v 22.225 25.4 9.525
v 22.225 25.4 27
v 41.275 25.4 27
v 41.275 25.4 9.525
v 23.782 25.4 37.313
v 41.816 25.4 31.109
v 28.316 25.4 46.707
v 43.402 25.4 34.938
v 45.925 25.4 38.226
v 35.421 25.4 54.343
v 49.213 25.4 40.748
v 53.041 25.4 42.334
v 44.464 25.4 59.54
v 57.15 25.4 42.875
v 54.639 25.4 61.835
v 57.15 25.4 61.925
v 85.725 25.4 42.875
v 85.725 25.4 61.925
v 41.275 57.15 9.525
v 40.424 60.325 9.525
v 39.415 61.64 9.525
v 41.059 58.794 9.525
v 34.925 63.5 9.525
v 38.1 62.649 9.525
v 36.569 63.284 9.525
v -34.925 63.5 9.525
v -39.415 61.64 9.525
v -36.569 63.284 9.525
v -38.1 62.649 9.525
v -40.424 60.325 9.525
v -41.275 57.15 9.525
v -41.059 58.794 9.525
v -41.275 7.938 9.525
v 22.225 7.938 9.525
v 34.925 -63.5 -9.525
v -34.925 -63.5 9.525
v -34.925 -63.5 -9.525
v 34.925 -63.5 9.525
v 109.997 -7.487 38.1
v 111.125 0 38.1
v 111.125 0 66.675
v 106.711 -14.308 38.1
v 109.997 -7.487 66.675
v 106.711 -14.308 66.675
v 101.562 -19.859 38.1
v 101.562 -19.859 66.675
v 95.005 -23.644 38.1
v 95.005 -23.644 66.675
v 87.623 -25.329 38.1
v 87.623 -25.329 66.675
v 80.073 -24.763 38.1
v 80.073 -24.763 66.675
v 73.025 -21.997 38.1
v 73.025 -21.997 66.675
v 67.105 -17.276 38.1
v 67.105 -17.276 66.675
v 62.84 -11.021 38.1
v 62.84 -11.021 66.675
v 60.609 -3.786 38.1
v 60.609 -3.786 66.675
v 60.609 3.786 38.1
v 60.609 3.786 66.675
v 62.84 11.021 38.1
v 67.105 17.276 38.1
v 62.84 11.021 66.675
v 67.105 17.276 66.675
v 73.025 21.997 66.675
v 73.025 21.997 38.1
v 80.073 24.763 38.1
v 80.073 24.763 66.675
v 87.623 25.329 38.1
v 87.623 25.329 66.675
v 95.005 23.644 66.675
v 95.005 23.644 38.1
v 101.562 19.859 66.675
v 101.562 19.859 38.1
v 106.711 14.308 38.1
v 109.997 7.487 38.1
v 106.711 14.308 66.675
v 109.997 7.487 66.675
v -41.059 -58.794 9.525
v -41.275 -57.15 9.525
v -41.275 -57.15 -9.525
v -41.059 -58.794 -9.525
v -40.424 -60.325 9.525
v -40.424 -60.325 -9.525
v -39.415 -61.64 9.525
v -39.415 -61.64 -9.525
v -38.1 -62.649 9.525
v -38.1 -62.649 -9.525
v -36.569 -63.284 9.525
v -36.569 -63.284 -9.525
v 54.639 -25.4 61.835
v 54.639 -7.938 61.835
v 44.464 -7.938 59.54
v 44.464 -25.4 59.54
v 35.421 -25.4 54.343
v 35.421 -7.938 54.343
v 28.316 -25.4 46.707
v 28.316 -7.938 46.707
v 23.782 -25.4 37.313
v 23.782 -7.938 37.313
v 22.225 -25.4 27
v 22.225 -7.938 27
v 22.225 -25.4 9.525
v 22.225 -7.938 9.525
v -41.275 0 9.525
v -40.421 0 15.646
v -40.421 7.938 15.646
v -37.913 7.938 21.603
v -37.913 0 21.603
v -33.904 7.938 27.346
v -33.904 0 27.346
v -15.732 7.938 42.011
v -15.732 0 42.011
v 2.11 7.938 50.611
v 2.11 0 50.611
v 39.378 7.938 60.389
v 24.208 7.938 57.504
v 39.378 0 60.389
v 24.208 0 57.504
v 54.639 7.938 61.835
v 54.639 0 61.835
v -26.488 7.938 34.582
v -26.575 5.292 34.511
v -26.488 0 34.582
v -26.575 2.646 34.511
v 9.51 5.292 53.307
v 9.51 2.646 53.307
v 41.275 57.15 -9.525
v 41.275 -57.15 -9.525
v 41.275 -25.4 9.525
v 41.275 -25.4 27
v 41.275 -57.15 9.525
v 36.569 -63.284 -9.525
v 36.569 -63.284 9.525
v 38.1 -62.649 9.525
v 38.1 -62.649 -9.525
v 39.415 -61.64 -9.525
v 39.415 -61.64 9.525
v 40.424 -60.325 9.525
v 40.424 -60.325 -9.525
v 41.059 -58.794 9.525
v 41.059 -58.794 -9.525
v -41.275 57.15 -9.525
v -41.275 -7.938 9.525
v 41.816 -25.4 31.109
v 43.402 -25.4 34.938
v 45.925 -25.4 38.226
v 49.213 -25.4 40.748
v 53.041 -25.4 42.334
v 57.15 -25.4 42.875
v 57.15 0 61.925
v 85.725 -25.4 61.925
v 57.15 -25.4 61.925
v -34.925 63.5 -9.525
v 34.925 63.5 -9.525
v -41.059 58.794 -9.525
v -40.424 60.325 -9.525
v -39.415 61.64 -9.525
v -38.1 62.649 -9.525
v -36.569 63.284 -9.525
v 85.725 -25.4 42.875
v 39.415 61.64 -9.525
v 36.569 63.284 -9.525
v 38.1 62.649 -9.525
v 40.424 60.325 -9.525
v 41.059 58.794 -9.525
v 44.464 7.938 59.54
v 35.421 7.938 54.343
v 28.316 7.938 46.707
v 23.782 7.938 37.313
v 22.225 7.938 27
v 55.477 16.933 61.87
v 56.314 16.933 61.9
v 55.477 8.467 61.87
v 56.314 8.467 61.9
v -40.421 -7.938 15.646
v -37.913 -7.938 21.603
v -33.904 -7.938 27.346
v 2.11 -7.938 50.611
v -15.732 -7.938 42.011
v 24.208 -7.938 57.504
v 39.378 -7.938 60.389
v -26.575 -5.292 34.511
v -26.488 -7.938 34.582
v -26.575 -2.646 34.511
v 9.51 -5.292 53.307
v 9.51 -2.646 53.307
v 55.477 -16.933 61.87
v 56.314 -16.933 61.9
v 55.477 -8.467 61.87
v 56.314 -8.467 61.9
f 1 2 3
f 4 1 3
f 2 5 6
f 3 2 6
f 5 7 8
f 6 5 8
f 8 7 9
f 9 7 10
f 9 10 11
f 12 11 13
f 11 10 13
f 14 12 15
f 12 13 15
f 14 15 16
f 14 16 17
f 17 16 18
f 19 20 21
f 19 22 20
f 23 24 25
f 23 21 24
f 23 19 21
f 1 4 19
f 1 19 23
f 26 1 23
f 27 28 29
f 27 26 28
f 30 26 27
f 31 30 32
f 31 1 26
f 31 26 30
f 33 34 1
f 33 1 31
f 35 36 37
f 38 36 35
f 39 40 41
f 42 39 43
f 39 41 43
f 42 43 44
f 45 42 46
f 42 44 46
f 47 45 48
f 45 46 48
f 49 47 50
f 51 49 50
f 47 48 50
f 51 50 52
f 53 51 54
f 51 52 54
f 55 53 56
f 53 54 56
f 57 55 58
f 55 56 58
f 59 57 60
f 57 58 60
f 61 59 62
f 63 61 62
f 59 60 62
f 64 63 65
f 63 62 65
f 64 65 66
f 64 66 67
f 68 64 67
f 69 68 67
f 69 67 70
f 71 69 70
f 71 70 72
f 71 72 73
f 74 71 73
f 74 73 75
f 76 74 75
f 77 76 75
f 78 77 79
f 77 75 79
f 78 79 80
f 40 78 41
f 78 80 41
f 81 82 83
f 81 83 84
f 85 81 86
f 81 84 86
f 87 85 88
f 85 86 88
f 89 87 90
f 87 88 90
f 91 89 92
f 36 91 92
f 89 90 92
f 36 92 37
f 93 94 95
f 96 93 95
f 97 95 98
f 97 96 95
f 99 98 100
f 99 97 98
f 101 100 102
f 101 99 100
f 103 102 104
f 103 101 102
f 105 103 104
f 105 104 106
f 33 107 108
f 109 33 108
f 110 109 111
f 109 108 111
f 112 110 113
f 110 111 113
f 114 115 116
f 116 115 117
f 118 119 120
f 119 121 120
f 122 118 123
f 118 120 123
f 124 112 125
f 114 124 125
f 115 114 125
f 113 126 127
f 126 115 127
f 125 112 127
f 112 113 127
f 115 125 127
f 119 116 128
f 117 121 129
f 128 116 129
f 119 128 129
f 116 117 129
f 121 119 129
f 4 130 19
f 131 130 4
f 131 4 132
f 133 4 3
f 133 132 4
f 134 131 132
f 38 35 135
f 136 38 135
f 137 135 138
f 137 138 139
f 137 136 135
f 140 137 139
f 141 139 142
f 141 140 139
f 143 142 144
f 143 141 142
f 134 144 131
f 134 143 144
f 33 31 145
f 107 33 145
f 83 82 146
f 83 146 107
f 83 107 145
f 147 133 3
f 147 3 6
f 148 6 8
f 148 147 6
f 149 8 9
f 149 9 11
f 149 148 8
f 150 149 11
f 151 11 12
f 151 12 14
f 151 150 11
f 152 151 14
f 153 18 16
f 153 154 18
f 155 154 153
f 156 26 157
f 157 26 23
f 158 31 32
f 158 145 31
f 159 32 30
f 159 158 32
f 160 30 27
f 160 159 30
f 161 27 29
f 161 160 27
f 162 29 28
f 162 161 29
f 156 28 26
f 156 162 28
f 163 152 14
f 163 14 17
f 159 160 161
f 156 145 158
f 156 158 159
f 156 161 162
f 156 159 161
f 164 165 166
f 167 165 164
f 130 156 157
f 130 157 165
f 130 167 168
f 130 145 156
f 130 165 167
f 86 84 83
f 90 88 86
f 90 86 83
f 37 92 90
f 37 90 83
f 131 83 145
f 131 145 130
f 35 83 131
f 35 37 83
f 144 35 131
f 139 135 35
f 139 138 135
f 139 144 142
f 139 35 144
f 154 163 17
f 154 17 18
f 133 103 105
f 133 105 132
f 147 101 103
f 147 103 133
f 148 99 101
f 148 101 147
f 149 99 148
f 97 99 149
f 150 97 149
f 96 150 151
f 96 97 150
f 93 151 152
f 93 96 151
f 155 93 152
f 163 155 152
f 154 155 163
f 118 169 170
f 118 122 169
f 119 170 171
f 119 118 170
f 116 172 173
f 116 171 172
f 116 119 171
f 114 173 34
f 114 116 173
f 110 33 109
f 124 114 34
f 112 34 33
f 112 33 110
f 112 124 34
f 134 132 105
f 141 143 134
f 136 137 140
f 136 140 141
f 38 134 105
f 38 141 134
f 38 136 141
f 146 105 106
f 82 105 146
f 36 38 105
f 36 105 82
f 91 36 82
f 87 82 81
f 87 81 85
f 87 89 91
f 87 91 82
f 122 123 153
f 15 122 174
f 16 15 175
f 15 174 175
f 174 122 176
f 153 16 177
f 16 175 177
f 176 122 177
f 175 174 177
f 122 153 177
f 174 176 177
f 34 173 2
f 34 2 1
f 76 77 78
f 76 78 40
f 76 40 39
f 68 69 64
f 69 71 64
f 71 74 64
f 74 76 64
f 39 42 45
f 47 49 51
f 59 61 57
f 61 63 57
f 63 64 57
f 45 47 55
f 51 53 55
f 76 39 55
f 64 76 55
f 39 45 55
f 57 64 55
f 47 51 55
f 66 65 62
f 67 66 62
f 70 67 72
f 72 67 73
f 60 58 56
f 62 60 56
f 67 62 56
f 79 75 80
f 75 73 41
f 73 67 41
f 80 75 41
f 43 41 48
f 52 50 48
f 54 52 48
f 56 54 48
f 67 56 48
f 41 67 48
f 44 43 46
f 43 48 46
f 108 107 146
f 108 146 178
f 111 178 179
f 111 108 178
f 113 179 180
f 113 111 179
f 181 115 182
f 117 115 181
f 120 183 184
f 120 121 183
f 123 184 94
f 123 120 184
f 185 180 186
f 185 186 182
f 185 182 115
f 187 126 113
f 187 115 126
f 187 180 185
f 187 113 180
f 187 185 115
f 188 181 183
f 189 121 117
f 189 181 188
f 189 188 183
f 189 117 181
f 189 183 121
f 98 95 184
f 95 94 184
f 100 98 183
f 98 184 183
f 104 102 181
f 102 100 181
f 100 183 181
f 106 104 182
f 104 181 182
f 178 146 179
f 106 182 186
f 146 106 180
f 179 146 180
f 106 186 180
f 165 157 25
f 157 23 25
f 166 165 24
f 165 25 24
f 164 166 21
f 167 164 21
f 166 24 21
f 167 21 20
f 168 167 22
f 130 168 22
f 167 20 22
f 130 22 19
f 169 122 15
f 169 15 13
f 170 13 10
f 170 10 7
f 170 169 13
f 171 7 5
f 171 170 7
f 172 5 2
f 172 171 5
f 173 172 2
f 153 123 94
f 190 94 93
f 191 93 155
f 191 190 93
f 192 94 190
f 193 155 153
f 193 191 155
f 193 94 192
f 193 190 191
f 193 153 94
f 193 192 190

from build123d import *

# Parameters (mm, degrees)
F1_DEPTH = 63.5
F0_W     = 25.4
F0_H     = 19.05
F2_DEPTH = 25.4
F3_DEPTH = 7.9375
F5_R     = 6.35


with BuildPart() as f1:
    # F0 (on Front) → F1 (new body, symmetric)
    with BuildSketch(Plane.XZ):
        Polygon((22.225, 9.525), (-41.275, 9.525), (-41.275, -9.525), (41.275, -9.525), (41.275, 9.525), align=None)
    extrude(amount=F1_DEPTH, both=True)

    # F0 (on Front) → F2 (join, symmetric)
    with BuildSketch(Plane.XZ):
        with BuildLine():
            Line((22.225, 27.0002), (22.225, 9.525))
            Line((22.225, 9.525), (41.275, 9.525))
            Line((41.275, 9.525), (41.275, 27.0002))
            ThreePointArc((41.275, 27.0002), (45.9246798487, 38.2255201513), (57.15, 42.8752))
            Line((57.15, 42.8752), (60.325, 42.8752))
            Line((60.325, 42.8752), (60.325, 61.9252))
            Line((60.325, 61.9252), (57.15, 61.9252))
            add(Edge.make_bspline(
                [(54.638823753, 61.8348037563), (55.4776769028, 61.8722770374), (56.3148513776, 61.9024473643), (57.15, 61.9252)],
                knots=[109.4876133849, 109.4876133849, 109.4876133849, 109.4876133849, 111.5045361635, 111.5045361635, 111.5045361635, 111.5045361635], degree=3))
            ThreePointArc((54.638823753, 61.8348037563), (31.5818708601, 50.7915092806), (22.225, 27.0002))
        make_face()
        with Locations((73.025, 52.4002)):
            Rectangle(F0_W, F0_H)
    extrude(amount=F2_DEPTH, both=True)

    # F0 (on Front) → F3 (join, symmetric)
    with BuildSketch(Plane.XZ):
        with BuildLine():
            add(Edge.make_bspline(
                [(-41.275, 9.525), (-41.3813263871, 36.2459845146), (9.1021129136, 59.800586009), (54.638823753, 61.8348037563)],
                knots=[0, 0, 0, 0, 109.4876133849, 109.4876133849, 109.4876133849, 109.4876133849], degree=3))
            Line((-41.275, 9.525), (22.225, 9.525))
            Line((22.225, 9.525), (22.225, 27.0002))
            ThreePointArc((22.225, 27.0002), (31.5818708601, 50.7915092806), (54.638823753, 61.8348037563))
        make_face()
    extrude(amount=F3_DEPTH, both=True)

    # F5
    f5_edges = [f1.edges().sort_by_distance(p)[0] for p in [
        (41.275, -63.5, 0),
        (-41.275, -63.5, 0),
        (-41.275, 63.5, 0),
        (41.275, 63.5, 0),
    ]]
    fillet(f5_edges, radius=F5_R)


with BuildPart() as f4:
    # F0 (on Front) → F4 (revolve)
    with BuildSketch(Plane.XZ):
        Polygon((85.725, 66.675), (85.725, 61.9252), (85.725, 42.8752), (85.725, 38.1), (111.125, 38.1), (111.125, 66.675), align=None)
    revolve(axis=Axis((85.725, 0, 52.4002), (0, 0, -1)))


solid = Compound([f1.part, f4.part])
